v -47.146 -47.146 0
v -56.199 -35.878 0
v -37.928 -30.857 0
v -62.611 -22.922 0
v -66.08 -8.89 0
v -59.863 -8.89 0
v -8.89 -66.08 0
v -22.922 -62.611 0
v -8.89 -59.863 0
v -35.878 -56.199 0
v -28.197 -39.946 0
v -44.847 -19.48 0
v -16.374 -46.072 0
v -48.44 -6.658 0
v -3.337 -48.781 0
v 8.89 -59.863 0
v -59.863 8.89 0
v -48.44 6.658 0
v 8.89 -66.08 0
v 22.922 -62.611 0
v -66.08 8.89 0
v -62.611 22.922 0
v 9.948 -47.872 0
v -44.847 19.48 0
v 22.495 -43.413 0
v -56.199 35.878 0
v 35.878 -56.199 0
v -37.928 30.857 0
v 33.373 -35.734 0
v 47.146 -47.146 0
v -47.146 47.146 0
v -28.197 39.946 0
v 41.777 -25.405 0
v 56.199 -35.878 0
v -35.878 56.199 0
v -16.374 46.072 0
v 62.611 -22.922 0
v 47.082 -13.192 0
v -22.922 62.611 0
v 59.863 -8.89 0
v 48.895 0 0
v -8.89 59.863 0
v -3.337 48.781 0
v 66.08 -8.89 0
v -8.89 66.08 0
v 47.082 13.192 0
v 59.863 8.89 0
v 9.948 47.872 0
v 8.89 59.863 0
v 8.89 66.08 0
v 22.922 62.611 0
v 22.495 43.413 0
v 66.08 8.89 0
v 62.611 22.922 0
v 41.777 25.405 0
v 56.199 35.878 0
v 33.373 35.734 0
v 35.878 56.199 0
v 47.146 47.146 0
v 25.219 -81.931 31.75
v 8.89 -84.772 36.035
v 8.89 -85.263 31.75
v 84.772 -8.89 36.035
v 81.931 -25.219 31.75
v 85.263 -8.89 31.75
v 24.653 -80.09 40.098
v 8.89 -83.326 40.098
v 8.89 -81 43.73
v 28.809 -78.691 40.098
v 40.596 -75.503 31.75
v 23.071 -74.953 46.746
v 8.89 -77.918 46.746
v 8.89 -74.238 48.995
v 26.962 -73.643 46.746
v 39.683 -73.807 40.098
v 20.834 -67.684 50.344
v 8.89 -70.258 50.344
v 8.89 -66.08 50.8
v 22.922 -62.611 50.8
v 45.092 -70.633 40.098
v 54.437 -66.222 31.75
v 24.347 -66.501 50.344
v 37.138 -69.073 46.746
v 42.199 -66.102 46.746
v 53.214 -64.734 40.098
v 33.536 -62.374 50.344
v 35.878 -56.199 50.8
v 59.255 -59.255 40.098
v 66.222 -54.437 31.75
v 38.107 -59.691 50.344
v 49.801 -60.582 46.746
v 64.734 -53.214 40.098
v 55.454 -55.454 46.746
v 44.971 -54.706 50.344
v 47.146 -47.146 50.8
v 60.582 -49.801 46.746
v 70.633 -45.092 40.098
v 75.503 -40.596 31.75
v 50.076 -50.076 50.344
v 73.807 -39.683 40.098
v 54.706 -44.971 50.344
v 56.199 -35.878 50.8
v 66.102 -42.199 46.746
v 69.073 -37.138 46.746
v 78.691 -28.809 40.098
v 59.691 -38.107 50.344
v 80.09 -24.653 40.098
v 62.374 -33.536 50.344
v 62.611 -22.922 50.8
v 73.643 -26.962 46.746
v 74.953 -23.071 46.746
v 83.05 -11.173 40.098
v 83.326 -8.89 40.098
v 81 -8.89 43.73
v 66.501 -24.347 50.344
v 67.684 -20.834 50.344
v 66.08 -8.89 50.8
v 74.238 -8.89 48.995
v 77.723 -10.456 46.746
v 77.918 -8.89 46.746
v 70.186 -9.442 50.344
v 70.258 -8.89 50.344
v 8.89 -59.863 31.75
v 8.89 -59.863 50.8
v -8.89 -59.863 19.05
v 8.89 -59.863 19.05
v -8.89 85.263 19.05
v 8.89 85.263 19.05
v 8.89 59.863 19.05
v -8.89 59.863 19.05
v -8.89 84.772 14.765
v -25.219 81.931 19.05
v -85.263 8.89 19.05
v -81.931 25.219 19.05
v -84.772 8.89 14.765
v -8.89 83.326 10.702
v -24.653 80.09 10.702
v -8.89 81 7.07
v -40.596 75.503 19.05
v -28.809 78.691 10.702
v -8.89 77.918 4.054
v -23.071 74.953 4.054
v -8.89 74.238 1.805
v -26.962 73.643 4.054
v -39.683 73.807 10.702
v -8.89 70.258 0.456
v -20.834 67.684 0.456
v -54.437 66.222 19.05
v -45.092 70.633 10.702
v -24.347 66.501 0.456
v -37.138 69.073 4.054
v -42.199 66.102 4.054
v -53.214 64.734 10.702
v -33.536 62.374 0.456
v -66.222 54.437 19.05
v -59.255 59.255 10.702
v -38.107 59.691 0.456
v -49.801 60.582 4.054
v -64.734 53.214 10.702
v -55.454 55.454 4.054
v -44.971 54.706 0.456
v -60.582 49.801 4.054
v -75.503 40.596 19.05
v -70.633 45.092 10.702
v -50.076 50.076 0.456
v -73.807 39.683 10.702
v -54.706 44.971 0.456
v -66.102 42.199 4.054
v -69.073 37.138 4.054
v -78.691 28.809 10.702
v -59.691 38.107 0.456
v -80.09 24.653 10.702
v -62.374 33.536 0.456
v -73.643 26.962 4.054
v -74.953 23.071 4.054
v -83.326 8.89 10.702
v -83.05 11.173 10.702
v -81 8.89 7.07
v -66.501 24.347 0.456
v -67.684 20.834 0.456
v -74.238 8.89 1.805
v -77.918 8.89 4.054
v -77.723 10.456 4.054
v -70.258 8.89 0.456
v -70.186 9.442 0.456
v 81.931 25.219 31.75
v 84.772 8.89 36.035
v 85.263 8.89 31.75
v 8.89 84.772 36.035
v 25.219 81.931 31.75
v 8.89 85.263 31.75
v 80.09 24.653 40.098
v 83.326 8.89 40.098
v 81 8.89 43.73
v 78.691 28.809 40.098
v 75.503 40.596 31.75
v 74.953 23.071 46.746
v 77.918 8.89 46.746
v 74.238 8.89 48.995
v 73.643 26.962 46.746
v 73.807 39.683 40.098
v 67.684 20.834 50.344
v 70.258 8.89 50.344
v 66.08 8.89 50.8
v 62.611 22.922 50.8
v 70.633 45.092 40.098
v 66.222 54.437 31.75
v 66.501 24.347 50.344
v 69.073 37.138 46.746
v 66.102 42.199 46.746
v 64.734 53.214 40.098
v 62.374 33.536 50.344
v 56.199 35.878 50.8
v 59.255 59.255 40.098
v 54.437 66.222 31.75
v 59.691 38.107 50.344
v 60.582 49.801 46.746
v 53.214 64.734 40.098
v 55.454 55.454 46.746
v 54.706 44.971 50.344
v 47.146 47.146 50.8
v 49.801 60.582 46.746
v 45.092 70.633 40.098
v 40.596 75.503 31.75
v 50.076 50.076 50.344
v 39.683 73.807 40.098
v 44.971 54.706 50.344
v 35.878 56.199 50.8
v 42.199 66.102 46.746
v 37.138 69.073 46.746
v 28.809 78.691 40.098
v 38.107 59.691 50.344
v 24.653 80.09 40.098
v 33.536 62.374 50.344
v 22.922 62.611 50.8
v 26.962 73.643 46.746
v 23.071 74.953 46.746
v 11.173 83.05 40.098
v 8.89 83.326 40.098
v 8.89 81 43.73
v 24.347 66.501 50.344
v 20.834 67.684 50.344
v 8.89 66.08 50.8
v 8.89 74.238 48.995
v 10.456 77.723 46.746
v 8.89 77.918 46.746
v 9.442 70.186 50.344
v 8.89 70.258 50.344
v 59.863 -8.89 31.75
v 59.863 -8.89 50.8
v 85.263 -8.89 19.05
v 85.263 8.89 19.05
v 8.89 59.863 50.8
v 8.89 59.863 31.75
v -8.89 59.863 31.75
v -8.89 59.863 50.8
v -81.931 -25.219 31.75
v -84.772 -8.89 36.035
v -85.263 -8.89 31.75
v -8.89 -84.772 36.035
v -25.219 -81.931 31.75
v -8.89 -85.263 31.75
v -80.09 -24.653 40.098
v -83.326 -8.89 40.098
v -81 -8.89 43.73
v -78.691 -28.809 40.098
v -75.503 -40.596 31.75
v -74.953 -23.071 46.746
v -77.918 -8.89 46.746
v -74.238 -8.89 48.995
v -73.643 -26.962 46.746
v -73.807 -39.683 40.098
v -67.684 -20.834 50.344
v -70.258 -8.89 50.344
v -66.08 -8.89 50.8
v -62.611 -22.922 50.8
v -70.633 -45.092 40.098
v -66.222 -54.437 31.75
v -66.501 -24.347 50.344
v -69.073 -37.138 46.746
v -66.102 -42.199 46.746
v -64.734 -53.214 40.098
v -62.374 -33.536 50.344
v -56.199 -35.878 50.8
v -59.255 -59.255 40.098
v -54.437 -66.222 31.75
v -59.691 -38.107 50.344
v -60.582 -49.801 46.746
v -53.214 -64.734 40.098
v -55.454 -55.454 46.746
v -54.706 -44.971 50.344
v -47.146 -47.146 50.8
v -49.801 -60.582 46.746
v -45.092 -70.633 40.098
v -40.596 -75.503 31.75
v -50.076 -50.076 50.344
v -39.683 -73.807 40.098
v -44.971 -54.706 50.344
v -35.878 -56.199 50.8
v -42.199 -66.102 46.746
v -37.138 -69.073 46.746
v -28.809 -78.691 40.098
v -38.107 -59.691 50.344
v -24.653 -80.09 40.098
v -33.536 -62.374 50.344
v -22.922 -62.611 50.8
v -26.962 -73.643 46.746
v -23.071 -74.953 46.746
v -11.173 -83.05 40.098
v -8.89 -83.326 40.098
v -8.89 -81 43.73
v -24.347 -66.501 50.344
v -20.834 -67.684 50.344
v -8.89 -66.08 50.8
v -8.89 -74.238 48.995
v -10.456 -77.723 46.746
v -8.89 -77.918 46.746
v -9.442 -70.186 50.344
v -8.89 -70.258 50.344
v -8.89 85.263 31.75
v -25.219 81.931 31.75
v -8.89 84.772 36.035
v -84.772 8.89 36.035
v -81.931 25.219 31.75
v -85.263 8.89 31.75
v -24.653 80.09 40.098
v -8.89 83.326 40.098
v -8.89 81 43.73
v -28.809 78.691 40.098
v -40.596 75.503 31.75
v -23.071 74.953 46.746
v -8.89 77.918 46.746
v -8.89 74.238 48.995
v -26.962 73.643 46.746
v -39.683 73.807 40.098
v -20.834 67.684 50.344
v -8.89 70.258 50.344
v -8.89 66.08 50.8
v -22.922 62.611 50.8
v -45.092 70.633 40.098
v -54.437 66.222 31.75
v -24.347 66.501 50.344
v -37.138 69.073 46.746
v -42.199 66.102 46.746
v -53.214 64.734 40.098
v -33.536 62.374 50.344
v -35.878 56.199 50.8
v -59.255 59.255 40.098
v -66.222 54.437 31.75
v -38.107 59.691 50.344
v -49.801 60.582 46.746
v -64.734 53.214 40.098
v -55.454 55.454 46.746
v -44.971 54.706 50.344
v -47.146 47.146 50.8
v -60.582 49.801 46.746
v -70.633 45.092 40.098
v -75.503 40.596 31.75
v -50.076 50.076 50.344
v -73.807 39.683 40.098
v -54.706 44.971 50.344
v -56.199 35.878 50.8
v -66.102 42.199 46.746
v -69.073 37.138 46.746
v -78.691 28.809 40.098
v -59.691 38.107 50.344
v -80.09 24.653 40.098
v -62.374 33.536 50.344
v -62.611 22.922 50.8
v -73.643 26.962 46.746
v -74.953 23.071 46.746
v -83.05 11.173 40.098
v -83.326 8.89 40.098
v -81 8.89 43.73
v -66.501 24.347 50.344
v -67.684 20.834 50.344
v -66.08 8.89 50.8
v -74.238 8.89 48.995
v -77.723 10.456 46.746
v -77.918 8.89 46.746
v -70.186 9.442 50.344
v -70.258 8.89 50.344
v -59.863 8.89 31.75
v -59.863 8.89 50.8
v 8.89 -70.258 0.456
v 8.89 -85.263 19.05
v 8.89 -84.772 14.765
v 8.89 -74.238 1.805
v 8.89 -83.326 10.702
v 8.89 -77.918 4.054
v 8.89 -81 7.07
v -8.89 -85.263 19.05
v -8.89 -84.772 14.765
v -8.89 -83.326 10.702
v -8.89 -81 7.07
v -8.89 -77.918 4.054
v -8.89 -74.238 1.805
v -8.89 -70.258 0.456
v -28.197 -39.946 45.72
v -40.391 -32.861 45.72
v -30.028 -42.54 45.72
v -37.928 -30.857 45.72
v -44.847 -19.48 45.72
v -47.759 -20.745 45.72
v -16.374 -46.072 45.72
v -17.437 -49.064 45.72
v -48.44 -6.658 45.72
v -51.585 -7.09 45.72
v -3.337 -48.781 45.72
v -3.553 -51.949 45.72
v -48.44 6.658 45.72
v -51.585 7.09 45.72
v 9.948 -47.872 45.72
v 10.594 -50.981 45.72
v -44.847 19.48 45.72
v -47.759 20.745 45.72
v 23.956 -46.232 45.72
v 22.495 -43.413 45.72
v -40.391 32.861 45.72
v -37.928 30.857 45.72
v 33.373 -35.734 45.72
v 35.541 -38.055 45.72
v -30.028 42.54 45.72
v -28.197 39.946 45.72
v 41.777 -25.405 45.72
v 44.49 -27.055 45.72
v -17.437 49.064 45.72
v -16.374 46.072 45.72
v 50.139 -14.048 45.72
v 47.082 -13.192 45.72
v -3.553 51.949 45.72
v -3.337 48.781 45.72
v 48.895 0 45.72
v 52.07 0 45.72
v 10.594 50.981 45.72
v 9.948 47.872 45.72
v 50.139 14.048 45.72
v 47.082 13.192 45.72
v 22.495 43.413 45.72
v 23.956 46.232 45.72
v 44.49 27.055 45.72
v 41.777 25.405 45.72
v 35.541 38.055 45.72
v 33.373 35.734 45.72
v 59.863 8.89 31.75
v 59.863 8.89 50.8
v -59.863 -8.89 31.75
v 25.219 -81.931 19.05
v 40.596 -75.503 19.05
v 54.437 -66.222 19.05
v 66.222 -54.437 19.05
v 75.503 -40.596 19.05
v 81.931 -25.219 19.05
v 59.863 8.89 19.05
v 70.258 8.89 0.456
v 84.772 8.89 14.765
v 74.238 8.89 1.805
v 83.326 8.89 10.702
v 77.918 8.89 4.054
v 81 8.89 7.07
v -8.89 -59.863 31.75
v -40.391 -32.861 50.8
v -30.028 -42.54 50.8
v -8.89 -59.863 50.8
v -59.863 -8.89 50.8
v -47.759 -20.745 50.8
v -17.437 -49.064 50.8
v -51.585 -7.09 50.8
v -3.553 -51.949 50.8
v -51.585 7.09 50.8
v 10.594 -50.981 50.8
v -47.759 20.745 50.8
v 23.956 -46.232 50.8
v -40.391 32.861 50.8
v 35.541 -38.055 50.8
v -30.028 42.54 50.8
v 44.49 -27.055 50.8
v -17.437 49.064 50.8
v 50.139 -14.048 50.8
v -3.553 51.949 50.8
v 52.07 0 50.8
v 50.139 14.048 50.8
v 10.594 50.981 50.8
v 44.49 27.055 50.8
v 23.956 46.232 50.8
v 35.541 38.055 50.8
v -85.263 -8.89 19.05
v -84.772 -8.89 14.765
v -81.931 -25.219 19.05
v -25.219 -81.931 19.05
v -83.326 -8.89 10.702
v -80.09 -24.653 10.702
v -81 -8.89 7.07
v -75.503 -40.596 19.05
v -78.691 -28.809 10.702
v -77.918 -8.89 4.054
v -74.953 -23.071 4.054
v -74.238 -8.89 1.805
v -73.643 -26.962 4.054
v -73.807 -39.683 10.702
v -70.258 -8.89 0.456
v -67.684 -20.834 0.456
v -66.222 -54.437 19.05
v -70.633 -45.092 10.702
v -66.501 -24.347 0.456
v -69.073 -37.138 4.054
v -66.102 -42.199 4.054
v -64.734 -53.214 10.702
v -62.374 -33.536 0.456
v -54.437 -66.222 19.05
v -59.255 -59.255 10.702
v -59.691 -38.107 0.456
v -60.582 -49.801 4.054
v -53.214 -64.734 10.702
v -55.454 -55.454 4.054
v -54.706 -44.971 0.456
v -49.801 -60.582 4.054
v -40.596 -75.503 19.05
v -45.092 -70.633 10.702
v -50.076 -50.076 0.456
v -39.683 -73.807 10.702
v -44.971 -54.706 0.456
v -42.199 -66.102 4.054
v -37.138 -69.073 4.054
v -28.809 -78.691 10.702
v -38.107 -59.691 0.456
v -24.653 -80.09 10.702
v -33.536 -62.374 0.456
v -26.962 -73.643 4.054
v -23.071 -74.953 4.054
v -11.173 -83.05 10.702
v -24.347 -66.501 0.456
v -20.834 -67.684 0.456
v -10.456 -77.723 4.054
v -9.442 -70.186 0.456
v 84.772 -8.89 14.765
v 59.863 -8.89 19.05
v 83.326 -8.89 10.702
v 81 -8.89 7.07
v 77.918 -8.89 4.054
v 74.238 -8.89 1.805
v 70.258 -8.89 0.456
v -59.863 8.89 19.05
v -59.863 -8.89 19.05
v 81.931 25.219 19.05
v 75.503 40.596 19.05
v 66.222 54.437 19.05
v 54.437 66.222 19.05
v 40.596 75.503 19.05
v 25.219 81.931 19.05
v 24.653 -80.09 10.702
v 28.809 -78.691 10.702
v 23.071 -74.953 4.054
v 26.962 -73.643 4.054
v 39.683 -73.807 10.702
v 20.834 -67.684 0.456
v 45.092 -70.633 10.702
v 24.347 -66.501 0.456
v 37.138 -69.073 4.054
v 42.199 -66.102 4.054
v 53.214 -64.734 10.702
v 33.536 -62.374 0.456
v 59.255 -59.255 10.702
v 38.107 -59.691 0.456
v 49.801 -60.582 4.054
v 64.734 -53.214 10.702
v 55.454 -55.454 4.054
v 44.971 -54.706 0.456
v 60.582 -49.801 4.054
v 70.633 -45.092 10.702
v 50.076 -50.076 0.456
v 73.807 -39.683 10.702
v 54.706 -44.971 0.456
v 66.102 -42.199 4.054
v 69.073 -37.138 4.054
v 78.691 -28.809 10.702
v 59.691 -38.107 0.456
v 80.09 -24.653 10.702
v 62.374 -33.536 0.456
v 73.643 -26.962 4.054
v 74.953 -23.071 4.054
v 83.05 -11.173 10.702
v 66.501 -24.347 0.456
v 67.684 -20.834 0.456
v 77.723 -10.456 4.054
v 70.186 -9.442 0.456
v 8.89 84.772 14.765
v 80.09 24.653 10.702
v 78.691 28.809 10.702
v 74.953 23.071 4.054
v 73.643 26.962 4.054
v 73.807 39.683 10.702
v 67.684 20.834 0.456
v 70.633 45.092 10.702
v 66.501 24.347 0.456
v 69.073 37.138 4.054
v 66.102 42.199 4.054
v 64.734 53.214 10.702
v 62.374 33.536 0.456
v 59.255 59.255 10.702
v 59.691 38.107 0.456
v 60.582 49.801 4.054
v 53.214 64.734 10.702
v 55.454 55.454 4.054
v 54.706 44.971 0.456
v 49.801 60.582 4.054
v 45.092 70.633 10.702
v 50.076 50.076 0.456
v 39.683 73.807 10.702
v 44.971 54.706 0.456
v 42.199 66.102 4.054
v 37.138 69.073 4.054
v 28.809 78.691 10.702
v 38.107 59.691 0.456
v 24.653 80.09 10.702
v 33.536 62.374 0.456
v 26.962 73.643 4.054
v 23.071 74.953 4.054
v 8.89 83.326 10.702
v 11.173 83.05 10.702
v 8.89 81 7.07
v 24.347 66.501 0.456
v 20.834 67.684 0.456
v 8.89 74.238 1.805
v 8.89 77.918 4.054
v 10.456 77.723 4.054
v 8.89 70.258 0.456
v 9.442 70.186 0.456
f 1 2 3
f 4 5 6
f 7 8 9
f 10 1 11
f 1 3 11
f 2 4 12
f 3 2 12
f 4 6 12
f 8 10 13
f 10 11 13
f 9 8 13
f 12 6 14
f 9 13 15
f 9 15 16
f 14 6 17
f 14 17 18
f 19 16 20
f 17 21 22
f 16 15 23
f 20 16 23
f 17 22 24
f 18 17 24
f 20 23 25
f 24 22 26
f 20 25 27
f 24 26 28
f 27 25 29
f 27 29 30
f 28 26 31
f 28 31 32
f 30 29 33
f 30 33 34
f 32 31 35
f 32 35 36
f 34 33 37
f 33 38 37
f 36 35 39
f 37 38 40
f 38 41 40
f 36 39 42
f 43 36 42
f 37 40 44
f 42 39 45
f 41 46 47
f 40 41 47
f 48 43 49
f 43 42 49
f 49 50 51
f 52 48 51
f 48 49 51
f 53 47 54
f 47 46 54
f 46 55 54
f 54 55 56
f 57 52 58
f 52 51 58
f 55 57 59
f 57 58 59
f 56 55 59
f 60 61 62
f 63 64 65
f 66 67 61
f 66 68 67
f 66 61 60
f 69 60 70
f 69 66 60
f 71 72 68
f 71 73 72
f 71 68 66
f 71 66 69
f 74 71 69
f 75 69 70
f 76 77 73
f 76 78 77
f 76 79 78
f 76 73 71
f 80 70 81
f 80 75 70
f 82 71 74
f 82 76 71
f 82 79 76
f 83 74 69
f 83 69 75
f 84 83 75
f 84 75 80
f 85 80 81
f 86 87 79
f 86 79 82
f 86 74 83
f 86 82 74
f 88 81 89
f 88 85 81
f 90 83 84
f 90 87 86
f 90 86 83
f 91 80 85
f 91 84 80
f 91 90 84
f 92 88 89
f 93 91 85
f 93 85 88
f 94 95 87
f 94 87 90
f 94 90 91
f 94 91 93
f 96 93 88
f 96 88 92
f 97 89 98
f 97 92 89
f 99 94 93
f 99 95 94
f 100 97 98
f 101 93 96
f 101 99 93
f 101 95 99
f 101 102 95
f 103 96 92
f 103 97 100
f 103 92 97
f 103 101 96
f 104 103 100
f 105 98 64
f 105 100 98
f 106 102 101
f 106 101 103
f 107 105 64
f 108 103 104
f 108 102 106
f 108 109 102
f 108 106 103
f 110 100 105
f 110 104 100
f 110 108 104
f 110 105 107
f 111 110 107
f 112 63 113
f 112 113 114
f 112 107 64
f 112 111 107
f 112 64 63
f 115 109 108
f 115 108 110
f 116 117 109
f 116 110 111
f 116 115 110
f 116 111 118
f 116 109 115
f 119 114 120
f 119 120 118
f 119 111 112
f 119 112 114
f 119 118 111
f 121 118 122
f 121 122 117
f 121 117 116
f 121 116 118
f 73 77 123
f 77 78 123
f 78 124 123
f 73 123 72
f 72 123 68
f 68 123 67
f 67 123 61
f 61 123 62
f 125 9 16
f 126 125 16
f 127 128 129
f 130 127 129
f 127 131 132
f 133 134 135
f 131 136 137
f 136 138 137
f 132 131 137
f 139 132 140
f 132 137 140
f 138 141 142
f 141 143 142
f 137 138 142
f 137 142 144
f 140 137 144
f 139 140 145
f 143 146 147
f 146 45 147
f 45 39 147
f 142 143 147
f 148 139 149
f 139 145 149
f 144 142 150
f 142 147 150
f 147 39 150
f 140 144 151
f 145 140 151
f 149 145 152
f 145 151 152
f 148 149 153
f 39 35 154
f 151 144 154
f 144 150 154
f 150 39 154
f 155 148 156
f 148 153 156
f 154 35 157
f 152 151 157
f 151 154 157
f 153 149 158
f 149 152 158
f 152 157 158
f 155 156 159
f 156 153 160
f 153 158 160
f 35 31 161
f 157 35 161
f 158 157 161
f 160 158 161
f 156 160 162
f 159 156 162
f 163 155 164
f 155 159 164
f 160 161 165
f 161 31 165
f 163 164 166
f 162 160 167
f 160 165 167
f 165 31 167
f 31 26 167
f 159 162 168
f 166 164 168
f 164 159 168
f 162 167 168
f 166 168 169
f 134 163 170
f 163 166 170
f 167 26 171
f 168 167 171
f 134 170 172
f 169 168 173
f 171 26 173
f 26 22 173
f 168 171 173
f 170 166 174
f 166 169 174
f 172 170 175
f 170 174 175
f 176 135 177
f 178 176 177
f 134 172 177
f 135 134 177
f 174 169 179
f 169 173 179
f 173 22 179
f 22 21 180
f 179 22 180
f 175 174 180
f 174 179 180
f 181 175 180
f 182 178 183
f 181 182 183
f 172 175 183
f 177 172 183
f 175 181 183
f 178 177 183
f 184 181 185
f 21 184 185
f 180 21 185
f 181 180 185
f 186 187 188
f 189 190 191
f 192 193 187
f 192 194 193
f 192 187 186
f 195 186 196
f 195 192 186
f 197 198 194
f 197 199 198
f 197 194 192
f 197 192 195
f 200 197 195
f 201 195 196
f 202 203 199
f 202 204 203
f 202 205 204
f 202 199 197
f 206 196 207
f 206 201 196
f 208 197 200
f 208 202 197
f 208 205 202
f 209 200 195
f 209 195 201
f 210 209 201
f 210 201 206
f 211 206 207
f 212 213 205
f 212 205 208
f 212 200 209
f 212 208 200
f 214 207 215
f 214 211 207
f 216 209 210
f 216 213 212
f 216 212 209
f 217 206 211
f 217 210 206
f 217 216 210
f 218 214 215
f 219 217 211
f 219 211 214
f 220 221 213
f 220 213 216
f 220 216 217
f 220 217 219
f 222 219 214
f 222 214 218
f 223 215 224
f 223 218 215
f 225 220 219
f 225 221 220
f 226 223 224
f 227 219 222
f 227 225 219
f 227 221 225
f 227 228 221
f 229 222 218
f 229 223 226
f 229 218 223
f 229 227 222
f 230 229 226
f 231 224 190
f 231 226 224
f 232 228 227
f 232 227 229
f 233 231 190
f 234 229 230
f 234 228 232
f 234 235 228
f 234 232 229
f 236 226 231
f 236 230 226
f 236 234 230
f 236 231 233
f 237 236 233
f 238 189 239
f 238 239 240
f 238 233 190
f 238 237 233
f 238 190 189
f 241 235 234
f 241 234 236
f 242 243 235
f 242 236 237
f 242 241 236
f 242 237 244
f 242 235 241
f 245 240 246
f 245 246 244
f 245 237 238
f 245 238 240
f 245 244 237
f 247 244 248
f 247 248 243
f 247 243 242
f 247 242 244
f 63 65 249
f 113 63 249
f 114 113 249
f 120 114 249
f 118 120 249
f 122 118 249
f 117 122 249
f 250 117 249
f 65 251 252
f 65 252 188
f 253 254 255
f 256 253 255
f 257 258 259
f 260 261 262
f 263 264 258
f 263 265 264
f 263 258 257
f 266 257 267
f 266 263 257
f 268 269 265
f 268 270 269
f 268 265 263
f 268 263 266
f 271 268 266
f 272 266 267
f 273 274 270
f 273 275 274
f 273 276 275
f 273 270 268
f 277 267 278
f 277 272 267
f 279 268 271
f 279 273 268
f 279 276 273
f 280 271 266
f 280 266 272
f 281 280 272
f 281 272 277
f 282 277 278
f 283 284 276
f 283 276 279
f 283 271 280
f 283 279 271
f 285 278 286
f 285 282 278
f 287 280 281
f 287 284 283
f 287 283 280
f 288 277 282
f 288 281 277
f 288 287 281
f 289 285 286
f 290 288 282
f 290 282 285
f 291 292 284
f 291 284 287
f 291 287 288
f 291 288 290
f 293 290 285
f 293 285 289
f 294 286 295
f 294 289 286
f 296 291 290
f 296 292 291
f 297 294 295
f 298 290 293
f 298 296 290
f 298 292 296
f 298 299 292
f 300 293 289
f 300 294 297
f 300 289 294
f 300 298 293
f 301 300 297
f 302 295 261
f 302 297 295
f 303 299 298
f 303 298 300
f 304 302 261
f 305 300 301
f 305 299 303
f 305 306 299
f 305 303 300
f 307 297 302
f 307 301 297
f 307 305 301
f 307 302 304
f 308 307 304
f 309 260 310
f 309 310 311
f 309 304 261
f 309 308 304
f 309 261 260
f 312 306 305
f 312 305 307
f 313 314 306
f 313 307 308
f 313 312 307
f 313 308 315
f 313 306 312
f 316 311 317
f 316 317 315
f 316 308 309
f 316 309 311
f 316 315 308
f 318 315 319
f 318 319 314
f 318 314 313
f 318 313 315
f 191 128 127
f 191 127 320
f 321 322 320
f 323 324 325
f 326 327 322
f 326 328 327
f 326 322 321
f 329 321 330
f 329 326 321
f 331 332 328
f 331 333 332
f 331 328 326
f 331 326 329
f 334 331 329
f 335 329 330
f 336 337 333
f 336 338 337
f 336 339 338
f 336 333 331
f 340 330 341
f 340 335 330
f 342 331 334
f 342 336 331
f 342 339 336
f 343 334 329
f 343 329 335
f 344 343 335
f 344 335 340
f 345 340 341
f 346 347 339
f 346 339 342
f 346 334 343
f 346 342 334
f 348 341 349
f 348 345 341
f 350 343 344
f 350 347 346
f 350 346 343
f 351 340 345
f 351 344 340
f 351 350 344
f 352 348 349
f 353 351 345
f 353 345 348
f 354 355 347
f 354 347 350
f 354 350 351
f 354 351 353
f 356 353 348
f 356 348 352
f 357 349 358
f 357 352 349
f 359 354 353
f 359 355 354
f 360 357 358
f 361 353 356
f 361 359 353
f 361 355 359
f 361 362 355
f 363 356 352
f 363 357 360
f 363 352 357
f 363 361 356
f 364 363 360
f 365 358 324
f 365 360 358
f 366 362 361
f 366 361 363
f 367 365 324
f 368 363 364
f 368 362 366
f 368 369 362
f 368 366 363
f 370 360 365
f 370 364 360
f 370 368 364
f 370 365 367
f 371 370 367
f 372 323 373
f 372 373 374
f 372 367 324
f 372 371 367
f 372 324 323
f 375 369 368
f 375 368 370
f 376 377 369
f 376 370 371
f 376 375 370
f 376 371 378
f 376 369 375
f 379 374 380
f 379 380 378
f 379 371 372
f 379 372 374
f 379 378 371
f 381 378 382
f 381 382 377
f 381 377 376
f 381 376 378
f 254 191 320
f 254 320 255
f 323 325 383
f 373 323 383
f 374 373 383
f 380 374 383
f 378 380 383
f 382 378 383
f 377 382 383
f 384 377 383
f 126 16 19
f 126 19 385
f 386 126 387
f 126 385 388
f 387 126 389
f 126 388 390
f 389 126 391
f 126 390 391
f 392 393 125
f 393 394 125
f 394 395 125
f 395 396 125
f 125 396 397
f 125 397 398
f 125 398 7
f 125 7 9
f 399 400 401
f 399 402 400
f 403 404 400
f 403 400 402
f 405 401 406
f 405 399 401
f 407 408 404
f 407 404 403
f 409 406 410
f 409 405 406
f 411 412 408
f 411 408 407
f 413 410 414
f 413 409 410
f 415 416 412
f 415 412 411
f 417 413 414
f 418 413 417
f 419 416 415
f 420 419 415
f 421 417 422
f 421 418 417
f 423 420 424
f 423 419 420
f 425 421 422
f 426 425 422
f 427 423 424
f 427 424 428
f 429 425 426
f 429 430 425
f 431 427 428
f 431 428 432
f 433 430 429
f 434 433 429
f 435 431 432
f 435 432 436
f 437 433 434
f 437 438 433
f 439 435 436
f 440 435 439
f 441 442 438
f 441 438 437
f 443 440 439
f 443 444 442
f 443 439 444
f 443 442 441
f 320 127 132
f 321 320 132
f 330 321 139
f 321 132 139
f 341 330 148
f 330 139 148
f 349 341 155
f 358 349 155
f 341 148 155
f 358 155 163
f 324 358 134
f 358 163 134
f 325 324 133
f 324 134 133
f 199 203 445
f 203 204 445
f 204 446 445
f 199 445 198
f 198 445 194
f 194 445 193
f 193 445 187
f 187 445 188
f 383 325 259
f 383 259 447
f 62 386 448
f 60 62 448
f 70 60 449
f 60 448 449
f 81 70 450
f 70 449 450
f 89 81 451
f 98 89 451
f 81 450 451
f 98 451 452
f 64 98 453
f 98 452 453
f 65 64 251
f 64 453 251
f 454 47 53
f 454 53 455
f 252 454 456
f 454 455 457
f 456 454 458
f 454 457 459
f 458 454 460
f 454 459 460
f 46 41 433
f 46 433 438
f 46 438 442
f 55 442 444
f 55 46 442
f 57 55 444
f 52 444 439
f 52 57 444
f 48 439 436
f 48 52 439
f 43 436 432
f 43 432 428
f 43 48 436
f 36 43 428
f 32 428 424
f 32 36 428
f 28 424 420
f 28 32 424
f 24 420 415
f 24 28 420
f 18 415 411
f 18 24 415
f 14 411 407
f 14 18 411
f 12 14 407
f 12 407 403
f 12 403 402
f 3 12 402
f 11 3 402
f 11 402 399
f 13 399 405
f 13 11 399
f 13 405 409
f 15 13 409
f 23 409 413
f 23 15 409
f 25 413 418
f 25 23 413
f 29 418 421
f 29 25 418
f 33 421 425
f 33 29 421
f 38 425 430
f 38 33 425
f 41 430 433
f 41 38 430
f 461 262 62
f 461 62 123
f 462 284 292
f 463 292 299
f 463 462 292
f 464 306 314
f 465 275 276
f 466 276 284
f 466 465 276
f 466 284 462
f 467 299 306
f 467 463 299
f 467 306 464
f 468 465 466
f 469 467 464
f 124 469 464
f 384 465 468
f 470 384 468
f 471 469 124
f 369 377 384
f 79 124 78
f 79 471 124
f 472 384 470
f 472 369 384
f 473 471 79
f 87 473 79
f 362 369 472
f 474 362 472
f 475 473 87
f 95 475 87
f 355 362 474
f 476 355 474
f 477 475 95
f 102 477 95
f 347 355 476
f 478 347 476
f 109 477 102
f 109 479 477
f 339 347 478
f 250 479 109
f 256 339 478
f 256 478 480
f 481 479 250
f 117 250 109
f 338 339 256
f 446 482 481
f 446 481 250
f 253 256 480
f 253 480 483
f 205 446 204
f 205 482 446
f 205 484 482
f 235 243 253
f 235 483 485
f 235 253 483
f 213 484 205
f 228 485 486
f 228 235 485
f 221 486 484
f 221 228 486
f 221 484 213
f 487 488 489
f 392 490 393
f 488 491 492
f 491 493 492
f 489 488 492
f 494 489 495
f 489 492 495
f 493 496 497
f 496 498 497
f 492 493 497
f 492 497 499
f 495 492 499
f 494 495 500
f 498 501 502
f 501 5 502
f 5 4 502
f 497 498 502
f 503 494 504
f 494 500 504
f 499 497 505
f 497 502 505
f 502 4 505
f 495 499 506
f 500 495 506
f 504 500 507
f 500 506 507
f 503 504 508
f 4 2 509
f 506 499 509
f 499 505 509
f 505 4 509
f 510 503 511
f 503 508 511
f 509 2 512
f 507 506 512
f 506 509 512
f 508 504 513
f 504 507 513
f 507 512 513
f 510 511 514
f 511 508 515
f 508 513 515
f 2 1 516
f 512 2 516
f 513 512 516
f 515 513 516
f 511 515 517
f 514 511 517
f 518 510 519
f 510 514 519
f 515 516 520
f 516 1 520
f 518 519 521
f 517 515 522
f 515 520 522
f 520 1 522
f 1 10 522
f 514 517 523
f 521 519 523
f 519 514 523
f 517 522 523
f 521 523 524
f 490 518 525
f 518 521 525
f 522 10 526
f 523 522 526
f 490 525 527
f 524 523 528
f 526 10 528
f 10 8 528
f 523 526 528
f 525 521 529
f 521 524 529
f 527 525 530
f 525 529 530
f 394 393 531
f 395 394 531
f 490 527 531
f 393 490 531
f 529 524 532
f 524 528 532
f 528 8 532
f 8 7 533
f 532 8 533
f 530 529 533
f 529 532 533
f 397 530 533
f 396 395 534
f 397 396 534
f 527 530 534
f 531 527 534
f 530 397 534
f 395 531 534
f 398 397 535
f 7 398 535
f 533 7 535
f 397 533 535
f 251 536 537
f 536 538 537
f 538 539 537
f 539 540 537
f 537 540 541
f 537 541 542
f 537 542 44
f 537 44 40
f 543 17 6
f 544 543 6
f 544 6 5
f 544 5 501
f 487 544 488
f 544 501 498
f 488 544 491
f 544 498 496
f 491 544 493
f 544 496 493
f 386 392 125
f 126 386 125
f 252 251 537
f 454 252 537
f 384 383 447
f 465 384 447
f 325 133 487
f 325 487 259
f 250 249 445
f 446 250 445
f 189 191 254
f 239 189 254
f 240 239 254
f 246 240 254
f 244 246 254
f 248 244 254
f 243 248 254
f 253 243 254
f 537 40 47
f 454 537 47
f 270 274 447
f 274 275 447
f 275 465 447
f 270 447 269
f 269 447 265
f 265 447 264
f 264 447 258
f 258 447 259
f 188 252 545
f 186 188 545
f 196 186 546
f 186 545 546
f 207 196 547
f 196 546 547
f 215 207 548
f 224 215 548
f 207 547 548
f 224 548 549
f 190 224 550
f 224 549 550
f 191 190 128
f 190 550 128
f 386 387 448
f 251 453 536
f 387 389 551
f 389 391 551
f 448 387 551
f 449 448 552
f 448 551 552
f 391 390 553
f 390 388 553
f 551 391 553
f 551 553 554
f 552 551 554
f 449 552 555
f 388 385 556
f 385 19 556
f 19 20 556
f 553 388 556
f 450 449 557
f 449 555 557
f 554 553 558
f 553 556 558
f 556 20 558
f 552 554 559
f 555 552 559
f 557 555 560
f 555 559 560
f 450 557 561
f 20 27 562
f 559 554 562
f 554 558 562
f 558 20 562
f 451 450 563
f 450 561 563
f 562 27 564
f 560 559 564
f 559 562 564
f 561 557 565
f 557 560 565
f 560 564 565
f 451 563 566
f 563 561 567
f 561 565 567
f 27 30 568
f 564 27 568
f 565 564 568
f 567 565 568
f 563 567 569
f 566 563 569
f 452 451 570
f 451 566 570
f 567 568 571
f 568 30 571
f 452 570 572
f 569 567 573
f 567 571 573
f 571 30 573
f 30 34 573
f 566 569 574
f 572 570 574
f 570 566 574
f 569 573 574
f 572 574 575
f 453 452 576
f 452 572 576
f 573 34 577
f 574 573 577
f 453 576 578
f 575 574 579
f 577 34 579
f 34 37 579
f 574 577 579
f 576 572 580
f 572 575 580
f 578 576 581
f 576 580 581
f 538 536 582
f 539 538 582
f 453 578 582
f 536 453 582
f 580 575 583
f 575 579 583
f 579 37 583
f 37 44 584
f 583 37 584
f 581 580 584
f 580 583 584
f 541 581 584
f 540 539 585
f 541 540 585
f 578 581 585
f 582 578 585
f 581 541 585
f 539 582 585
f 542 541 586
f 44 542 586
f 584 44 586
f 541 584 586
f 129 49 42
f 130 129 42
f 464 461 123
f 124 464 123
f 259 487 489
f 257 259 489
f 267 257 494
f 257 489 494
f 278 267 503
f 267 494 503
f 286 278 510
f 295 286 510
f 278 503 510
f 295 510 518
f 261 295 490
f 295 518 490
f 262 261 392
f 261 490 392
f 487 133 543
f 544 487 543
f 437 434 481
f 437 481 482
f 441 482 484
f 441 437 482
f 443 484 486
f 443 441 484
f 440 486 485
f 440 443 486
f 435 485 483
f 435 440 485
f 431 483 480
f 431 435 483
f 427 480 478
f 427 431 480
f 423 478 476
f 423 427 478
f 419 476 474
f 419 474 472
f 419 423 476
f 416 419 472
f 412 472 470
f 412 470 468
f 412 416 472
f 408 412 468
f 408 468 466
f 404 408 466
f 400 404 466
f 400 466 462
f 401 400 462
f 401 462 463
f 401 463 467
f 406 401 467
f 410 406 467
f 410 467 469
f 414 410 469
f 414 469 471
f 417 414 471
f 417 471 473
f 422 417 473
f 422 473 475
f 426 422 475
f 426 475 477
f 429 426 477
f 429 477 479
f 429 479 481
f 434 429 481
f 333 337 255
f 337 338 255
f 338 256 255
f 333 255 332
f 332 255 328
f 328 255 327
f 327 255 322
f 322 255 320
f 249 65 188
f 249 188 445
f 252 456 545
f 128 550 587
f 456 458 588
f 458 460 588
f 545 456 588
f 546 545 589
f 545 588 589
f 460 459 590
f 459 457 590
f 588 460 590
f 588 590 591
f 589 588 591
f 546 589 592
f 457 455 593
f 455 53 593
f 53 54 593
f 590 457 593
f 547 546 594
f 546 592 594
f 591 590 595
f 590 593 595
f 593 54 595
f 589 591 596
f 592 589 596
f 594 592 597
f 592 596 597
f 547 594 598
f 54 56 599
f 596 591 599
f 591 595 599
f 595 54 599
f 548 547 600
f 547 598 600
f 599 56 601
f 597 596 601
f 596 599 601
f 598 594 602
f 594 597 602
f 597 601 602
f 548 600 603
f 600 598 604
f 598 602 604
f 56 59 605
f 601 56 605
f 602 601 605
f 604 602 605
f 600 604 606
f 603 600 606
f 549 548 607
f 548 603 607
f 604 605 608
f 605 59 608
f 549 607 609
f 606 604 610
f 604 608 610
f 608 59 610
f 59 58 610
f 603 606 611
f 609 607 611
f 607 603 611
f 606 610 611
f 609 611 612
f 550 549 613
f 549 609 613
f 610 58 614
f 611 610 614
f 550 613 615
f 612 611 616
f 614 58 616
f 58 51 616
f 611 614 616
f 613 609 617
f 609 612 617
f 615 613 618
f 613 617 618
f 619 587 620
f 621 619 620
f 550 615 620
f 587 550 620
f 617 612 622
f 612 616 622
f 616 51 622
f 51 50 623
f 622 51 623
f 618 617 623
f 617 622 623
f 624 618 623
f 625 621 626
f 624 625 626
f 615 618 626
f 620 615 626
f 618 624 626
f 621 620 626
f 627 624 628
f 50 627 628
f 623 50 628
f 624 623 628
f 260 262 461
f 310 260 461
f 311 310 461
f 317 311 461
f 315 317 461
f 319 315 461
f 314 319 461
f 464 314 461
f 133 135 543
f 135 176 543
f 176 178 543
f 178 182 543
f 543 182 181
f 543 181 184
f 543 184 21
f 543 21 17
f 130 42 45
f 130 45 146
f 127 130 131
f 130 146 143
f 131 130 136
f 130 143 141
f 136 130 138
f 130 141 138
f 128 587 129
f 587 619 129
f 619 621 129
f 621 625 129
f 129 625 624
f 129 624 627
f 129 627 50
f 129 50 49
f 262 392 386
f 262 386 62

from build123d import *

# Parameters (mm, degrees)
F0_R      = 52.07
F1_DEPTH  = 50.8
F2_R      = 19.05
F5_W      = 25.4
F5_H      = 12.7
F7_DEPTH  = 17.78
F6_W      = 25.4
F6_H      = 12.7
F8_DEPTH  = 17.78
F4_W      = 25.4
F4_H      = 12.7
F9_DEPTH  = 17.78
F3_W      = 25.4
F3_H      = 12.7
F10_DEPTH = 17.78
F0_R_2    = 48.895
F11_DEPTH = 45.72


with BuildPart() as f1:
    # F0 (on Top) → F1 (new body)
    with BuildSketch(Plane.XY):
        with BuildLine():
            Line((59.8627909759, 8.89), (85.2627909759, 8.89))
            ThreePointArc((85.2627909759, 8.89), (60.6167288172, 60.6167288172), (8.89, 85.2627909759))
            Line((8.89, 85.2627909759), (8.89, 59.8627909759))
            Line((8.89, 59.8627909759), (-8.89, 59.8627909759))
            Line((-8.89, 59.8627909759), (-8.89, 85.2627909759))
            ThreePointArc((-8.89, 85.2627909759), (-60.6167288172, 60.6167288172), (-85.2627909759, 8.89))
            Line((-85.2627909759, 8.89), (-59.8627909759, 8.89))
            Line((-59.8627909759, 8.89), (-59.8627909759, -8.89))
            Line((-59.8627909759, -8.89), (-85.2627909759, -8.89))
            ThreePointArc((-85.2627909759, -8.89), (-60.6167288172, -60.6167288172), (-8.89, -85.2627909759))
            Line((-8.89, -85.2627909759), (-8.89, -59.8627909759))
            Line((-8.89, -59.8627909759), (8.89, -59.8627909759))
            Line((8.89, -59.8627909759), (8.89, -85.2627909759))
            ThreePointArc((8.89, -85.2627909759), (60.6167288172, -60.6167288172), (85.2627909759, -8.89))
            Line((85.2627909759, -8.89), (59.8627909759, -8.89))
            Line((59.8627909759, -8.89), (59.8627909759, 8.89))
        make_face()
        Circle(F0_R, mode=Mode.SUBTRACT)
    extrude(amount=F1_DEPTH)

    # F2
    f2_edges = [f1.edges().sort_by_distance(p)[0] for p in [
        (-60.616729, -60.616729, 50.8),
        (60.616729, -60.616729, 50.8),
        (60.616729, 60.616729, 50.8),
        (-60.616729, 60.616729, 50.8),
        (60.616729, -60.616729, 0),
        (60.616729, 60.616729, 0),
        (-60.616729, -60.616729, 0),
        (-60.616729, 60.616729, 0),
    ]]
    fillet(f2_edges, radius=F2_R)

    # F5 (on face) → F7 (join)
    with BuildSketch(Plane(origin=(0, -8.89, 0), x_dir=(-1, 0, 0), z_dir=(0, 1, 0))):
        with Locations((-72.5627909759, 25.4)):
            Rectangle(F5_W, F5_H)
    extrude(amount=F7_DEPTH)

    # F6 (on face) → F8 (join)
    with BuildSketch(Plane(origin=(8.89, 0, 0), x_dir=(0, -1, 0), z_dir=(-1, 0, 0))):
        with Locations((-72.5627909759, 25.4)):
            Rectangle(F6_W, F6_H)
    extrude(amount=F8_DEPTH)

    # F4 (on face) → F9 (join)
    with BuildSketch(Plane.XZ.offset(-8.89)):
        with Locations((-72.5627909759, 25.4)):
            Rectangle(F4_W, F4_H)
    extrude(amount=F9_DEPTH)

    # F3 (on face) → F10 (join)
    with BuildSketch(Plane.YZ.offset(-8.89)):
        with Locations((-72.5627909759, 25.4)):
            Rectangle(F3_W, F3_H)
    extrude(amount=F10_DEPTH)

    # F0 (on Top) → F11 (join)
    with BuildSketch(Plane.XY):
        Circle(F0_R)
        Circle(F0_R_2, mode=Mode.SUBTRACT)
    extrude(amount=F11_DEPTH)


solid = f1.part
